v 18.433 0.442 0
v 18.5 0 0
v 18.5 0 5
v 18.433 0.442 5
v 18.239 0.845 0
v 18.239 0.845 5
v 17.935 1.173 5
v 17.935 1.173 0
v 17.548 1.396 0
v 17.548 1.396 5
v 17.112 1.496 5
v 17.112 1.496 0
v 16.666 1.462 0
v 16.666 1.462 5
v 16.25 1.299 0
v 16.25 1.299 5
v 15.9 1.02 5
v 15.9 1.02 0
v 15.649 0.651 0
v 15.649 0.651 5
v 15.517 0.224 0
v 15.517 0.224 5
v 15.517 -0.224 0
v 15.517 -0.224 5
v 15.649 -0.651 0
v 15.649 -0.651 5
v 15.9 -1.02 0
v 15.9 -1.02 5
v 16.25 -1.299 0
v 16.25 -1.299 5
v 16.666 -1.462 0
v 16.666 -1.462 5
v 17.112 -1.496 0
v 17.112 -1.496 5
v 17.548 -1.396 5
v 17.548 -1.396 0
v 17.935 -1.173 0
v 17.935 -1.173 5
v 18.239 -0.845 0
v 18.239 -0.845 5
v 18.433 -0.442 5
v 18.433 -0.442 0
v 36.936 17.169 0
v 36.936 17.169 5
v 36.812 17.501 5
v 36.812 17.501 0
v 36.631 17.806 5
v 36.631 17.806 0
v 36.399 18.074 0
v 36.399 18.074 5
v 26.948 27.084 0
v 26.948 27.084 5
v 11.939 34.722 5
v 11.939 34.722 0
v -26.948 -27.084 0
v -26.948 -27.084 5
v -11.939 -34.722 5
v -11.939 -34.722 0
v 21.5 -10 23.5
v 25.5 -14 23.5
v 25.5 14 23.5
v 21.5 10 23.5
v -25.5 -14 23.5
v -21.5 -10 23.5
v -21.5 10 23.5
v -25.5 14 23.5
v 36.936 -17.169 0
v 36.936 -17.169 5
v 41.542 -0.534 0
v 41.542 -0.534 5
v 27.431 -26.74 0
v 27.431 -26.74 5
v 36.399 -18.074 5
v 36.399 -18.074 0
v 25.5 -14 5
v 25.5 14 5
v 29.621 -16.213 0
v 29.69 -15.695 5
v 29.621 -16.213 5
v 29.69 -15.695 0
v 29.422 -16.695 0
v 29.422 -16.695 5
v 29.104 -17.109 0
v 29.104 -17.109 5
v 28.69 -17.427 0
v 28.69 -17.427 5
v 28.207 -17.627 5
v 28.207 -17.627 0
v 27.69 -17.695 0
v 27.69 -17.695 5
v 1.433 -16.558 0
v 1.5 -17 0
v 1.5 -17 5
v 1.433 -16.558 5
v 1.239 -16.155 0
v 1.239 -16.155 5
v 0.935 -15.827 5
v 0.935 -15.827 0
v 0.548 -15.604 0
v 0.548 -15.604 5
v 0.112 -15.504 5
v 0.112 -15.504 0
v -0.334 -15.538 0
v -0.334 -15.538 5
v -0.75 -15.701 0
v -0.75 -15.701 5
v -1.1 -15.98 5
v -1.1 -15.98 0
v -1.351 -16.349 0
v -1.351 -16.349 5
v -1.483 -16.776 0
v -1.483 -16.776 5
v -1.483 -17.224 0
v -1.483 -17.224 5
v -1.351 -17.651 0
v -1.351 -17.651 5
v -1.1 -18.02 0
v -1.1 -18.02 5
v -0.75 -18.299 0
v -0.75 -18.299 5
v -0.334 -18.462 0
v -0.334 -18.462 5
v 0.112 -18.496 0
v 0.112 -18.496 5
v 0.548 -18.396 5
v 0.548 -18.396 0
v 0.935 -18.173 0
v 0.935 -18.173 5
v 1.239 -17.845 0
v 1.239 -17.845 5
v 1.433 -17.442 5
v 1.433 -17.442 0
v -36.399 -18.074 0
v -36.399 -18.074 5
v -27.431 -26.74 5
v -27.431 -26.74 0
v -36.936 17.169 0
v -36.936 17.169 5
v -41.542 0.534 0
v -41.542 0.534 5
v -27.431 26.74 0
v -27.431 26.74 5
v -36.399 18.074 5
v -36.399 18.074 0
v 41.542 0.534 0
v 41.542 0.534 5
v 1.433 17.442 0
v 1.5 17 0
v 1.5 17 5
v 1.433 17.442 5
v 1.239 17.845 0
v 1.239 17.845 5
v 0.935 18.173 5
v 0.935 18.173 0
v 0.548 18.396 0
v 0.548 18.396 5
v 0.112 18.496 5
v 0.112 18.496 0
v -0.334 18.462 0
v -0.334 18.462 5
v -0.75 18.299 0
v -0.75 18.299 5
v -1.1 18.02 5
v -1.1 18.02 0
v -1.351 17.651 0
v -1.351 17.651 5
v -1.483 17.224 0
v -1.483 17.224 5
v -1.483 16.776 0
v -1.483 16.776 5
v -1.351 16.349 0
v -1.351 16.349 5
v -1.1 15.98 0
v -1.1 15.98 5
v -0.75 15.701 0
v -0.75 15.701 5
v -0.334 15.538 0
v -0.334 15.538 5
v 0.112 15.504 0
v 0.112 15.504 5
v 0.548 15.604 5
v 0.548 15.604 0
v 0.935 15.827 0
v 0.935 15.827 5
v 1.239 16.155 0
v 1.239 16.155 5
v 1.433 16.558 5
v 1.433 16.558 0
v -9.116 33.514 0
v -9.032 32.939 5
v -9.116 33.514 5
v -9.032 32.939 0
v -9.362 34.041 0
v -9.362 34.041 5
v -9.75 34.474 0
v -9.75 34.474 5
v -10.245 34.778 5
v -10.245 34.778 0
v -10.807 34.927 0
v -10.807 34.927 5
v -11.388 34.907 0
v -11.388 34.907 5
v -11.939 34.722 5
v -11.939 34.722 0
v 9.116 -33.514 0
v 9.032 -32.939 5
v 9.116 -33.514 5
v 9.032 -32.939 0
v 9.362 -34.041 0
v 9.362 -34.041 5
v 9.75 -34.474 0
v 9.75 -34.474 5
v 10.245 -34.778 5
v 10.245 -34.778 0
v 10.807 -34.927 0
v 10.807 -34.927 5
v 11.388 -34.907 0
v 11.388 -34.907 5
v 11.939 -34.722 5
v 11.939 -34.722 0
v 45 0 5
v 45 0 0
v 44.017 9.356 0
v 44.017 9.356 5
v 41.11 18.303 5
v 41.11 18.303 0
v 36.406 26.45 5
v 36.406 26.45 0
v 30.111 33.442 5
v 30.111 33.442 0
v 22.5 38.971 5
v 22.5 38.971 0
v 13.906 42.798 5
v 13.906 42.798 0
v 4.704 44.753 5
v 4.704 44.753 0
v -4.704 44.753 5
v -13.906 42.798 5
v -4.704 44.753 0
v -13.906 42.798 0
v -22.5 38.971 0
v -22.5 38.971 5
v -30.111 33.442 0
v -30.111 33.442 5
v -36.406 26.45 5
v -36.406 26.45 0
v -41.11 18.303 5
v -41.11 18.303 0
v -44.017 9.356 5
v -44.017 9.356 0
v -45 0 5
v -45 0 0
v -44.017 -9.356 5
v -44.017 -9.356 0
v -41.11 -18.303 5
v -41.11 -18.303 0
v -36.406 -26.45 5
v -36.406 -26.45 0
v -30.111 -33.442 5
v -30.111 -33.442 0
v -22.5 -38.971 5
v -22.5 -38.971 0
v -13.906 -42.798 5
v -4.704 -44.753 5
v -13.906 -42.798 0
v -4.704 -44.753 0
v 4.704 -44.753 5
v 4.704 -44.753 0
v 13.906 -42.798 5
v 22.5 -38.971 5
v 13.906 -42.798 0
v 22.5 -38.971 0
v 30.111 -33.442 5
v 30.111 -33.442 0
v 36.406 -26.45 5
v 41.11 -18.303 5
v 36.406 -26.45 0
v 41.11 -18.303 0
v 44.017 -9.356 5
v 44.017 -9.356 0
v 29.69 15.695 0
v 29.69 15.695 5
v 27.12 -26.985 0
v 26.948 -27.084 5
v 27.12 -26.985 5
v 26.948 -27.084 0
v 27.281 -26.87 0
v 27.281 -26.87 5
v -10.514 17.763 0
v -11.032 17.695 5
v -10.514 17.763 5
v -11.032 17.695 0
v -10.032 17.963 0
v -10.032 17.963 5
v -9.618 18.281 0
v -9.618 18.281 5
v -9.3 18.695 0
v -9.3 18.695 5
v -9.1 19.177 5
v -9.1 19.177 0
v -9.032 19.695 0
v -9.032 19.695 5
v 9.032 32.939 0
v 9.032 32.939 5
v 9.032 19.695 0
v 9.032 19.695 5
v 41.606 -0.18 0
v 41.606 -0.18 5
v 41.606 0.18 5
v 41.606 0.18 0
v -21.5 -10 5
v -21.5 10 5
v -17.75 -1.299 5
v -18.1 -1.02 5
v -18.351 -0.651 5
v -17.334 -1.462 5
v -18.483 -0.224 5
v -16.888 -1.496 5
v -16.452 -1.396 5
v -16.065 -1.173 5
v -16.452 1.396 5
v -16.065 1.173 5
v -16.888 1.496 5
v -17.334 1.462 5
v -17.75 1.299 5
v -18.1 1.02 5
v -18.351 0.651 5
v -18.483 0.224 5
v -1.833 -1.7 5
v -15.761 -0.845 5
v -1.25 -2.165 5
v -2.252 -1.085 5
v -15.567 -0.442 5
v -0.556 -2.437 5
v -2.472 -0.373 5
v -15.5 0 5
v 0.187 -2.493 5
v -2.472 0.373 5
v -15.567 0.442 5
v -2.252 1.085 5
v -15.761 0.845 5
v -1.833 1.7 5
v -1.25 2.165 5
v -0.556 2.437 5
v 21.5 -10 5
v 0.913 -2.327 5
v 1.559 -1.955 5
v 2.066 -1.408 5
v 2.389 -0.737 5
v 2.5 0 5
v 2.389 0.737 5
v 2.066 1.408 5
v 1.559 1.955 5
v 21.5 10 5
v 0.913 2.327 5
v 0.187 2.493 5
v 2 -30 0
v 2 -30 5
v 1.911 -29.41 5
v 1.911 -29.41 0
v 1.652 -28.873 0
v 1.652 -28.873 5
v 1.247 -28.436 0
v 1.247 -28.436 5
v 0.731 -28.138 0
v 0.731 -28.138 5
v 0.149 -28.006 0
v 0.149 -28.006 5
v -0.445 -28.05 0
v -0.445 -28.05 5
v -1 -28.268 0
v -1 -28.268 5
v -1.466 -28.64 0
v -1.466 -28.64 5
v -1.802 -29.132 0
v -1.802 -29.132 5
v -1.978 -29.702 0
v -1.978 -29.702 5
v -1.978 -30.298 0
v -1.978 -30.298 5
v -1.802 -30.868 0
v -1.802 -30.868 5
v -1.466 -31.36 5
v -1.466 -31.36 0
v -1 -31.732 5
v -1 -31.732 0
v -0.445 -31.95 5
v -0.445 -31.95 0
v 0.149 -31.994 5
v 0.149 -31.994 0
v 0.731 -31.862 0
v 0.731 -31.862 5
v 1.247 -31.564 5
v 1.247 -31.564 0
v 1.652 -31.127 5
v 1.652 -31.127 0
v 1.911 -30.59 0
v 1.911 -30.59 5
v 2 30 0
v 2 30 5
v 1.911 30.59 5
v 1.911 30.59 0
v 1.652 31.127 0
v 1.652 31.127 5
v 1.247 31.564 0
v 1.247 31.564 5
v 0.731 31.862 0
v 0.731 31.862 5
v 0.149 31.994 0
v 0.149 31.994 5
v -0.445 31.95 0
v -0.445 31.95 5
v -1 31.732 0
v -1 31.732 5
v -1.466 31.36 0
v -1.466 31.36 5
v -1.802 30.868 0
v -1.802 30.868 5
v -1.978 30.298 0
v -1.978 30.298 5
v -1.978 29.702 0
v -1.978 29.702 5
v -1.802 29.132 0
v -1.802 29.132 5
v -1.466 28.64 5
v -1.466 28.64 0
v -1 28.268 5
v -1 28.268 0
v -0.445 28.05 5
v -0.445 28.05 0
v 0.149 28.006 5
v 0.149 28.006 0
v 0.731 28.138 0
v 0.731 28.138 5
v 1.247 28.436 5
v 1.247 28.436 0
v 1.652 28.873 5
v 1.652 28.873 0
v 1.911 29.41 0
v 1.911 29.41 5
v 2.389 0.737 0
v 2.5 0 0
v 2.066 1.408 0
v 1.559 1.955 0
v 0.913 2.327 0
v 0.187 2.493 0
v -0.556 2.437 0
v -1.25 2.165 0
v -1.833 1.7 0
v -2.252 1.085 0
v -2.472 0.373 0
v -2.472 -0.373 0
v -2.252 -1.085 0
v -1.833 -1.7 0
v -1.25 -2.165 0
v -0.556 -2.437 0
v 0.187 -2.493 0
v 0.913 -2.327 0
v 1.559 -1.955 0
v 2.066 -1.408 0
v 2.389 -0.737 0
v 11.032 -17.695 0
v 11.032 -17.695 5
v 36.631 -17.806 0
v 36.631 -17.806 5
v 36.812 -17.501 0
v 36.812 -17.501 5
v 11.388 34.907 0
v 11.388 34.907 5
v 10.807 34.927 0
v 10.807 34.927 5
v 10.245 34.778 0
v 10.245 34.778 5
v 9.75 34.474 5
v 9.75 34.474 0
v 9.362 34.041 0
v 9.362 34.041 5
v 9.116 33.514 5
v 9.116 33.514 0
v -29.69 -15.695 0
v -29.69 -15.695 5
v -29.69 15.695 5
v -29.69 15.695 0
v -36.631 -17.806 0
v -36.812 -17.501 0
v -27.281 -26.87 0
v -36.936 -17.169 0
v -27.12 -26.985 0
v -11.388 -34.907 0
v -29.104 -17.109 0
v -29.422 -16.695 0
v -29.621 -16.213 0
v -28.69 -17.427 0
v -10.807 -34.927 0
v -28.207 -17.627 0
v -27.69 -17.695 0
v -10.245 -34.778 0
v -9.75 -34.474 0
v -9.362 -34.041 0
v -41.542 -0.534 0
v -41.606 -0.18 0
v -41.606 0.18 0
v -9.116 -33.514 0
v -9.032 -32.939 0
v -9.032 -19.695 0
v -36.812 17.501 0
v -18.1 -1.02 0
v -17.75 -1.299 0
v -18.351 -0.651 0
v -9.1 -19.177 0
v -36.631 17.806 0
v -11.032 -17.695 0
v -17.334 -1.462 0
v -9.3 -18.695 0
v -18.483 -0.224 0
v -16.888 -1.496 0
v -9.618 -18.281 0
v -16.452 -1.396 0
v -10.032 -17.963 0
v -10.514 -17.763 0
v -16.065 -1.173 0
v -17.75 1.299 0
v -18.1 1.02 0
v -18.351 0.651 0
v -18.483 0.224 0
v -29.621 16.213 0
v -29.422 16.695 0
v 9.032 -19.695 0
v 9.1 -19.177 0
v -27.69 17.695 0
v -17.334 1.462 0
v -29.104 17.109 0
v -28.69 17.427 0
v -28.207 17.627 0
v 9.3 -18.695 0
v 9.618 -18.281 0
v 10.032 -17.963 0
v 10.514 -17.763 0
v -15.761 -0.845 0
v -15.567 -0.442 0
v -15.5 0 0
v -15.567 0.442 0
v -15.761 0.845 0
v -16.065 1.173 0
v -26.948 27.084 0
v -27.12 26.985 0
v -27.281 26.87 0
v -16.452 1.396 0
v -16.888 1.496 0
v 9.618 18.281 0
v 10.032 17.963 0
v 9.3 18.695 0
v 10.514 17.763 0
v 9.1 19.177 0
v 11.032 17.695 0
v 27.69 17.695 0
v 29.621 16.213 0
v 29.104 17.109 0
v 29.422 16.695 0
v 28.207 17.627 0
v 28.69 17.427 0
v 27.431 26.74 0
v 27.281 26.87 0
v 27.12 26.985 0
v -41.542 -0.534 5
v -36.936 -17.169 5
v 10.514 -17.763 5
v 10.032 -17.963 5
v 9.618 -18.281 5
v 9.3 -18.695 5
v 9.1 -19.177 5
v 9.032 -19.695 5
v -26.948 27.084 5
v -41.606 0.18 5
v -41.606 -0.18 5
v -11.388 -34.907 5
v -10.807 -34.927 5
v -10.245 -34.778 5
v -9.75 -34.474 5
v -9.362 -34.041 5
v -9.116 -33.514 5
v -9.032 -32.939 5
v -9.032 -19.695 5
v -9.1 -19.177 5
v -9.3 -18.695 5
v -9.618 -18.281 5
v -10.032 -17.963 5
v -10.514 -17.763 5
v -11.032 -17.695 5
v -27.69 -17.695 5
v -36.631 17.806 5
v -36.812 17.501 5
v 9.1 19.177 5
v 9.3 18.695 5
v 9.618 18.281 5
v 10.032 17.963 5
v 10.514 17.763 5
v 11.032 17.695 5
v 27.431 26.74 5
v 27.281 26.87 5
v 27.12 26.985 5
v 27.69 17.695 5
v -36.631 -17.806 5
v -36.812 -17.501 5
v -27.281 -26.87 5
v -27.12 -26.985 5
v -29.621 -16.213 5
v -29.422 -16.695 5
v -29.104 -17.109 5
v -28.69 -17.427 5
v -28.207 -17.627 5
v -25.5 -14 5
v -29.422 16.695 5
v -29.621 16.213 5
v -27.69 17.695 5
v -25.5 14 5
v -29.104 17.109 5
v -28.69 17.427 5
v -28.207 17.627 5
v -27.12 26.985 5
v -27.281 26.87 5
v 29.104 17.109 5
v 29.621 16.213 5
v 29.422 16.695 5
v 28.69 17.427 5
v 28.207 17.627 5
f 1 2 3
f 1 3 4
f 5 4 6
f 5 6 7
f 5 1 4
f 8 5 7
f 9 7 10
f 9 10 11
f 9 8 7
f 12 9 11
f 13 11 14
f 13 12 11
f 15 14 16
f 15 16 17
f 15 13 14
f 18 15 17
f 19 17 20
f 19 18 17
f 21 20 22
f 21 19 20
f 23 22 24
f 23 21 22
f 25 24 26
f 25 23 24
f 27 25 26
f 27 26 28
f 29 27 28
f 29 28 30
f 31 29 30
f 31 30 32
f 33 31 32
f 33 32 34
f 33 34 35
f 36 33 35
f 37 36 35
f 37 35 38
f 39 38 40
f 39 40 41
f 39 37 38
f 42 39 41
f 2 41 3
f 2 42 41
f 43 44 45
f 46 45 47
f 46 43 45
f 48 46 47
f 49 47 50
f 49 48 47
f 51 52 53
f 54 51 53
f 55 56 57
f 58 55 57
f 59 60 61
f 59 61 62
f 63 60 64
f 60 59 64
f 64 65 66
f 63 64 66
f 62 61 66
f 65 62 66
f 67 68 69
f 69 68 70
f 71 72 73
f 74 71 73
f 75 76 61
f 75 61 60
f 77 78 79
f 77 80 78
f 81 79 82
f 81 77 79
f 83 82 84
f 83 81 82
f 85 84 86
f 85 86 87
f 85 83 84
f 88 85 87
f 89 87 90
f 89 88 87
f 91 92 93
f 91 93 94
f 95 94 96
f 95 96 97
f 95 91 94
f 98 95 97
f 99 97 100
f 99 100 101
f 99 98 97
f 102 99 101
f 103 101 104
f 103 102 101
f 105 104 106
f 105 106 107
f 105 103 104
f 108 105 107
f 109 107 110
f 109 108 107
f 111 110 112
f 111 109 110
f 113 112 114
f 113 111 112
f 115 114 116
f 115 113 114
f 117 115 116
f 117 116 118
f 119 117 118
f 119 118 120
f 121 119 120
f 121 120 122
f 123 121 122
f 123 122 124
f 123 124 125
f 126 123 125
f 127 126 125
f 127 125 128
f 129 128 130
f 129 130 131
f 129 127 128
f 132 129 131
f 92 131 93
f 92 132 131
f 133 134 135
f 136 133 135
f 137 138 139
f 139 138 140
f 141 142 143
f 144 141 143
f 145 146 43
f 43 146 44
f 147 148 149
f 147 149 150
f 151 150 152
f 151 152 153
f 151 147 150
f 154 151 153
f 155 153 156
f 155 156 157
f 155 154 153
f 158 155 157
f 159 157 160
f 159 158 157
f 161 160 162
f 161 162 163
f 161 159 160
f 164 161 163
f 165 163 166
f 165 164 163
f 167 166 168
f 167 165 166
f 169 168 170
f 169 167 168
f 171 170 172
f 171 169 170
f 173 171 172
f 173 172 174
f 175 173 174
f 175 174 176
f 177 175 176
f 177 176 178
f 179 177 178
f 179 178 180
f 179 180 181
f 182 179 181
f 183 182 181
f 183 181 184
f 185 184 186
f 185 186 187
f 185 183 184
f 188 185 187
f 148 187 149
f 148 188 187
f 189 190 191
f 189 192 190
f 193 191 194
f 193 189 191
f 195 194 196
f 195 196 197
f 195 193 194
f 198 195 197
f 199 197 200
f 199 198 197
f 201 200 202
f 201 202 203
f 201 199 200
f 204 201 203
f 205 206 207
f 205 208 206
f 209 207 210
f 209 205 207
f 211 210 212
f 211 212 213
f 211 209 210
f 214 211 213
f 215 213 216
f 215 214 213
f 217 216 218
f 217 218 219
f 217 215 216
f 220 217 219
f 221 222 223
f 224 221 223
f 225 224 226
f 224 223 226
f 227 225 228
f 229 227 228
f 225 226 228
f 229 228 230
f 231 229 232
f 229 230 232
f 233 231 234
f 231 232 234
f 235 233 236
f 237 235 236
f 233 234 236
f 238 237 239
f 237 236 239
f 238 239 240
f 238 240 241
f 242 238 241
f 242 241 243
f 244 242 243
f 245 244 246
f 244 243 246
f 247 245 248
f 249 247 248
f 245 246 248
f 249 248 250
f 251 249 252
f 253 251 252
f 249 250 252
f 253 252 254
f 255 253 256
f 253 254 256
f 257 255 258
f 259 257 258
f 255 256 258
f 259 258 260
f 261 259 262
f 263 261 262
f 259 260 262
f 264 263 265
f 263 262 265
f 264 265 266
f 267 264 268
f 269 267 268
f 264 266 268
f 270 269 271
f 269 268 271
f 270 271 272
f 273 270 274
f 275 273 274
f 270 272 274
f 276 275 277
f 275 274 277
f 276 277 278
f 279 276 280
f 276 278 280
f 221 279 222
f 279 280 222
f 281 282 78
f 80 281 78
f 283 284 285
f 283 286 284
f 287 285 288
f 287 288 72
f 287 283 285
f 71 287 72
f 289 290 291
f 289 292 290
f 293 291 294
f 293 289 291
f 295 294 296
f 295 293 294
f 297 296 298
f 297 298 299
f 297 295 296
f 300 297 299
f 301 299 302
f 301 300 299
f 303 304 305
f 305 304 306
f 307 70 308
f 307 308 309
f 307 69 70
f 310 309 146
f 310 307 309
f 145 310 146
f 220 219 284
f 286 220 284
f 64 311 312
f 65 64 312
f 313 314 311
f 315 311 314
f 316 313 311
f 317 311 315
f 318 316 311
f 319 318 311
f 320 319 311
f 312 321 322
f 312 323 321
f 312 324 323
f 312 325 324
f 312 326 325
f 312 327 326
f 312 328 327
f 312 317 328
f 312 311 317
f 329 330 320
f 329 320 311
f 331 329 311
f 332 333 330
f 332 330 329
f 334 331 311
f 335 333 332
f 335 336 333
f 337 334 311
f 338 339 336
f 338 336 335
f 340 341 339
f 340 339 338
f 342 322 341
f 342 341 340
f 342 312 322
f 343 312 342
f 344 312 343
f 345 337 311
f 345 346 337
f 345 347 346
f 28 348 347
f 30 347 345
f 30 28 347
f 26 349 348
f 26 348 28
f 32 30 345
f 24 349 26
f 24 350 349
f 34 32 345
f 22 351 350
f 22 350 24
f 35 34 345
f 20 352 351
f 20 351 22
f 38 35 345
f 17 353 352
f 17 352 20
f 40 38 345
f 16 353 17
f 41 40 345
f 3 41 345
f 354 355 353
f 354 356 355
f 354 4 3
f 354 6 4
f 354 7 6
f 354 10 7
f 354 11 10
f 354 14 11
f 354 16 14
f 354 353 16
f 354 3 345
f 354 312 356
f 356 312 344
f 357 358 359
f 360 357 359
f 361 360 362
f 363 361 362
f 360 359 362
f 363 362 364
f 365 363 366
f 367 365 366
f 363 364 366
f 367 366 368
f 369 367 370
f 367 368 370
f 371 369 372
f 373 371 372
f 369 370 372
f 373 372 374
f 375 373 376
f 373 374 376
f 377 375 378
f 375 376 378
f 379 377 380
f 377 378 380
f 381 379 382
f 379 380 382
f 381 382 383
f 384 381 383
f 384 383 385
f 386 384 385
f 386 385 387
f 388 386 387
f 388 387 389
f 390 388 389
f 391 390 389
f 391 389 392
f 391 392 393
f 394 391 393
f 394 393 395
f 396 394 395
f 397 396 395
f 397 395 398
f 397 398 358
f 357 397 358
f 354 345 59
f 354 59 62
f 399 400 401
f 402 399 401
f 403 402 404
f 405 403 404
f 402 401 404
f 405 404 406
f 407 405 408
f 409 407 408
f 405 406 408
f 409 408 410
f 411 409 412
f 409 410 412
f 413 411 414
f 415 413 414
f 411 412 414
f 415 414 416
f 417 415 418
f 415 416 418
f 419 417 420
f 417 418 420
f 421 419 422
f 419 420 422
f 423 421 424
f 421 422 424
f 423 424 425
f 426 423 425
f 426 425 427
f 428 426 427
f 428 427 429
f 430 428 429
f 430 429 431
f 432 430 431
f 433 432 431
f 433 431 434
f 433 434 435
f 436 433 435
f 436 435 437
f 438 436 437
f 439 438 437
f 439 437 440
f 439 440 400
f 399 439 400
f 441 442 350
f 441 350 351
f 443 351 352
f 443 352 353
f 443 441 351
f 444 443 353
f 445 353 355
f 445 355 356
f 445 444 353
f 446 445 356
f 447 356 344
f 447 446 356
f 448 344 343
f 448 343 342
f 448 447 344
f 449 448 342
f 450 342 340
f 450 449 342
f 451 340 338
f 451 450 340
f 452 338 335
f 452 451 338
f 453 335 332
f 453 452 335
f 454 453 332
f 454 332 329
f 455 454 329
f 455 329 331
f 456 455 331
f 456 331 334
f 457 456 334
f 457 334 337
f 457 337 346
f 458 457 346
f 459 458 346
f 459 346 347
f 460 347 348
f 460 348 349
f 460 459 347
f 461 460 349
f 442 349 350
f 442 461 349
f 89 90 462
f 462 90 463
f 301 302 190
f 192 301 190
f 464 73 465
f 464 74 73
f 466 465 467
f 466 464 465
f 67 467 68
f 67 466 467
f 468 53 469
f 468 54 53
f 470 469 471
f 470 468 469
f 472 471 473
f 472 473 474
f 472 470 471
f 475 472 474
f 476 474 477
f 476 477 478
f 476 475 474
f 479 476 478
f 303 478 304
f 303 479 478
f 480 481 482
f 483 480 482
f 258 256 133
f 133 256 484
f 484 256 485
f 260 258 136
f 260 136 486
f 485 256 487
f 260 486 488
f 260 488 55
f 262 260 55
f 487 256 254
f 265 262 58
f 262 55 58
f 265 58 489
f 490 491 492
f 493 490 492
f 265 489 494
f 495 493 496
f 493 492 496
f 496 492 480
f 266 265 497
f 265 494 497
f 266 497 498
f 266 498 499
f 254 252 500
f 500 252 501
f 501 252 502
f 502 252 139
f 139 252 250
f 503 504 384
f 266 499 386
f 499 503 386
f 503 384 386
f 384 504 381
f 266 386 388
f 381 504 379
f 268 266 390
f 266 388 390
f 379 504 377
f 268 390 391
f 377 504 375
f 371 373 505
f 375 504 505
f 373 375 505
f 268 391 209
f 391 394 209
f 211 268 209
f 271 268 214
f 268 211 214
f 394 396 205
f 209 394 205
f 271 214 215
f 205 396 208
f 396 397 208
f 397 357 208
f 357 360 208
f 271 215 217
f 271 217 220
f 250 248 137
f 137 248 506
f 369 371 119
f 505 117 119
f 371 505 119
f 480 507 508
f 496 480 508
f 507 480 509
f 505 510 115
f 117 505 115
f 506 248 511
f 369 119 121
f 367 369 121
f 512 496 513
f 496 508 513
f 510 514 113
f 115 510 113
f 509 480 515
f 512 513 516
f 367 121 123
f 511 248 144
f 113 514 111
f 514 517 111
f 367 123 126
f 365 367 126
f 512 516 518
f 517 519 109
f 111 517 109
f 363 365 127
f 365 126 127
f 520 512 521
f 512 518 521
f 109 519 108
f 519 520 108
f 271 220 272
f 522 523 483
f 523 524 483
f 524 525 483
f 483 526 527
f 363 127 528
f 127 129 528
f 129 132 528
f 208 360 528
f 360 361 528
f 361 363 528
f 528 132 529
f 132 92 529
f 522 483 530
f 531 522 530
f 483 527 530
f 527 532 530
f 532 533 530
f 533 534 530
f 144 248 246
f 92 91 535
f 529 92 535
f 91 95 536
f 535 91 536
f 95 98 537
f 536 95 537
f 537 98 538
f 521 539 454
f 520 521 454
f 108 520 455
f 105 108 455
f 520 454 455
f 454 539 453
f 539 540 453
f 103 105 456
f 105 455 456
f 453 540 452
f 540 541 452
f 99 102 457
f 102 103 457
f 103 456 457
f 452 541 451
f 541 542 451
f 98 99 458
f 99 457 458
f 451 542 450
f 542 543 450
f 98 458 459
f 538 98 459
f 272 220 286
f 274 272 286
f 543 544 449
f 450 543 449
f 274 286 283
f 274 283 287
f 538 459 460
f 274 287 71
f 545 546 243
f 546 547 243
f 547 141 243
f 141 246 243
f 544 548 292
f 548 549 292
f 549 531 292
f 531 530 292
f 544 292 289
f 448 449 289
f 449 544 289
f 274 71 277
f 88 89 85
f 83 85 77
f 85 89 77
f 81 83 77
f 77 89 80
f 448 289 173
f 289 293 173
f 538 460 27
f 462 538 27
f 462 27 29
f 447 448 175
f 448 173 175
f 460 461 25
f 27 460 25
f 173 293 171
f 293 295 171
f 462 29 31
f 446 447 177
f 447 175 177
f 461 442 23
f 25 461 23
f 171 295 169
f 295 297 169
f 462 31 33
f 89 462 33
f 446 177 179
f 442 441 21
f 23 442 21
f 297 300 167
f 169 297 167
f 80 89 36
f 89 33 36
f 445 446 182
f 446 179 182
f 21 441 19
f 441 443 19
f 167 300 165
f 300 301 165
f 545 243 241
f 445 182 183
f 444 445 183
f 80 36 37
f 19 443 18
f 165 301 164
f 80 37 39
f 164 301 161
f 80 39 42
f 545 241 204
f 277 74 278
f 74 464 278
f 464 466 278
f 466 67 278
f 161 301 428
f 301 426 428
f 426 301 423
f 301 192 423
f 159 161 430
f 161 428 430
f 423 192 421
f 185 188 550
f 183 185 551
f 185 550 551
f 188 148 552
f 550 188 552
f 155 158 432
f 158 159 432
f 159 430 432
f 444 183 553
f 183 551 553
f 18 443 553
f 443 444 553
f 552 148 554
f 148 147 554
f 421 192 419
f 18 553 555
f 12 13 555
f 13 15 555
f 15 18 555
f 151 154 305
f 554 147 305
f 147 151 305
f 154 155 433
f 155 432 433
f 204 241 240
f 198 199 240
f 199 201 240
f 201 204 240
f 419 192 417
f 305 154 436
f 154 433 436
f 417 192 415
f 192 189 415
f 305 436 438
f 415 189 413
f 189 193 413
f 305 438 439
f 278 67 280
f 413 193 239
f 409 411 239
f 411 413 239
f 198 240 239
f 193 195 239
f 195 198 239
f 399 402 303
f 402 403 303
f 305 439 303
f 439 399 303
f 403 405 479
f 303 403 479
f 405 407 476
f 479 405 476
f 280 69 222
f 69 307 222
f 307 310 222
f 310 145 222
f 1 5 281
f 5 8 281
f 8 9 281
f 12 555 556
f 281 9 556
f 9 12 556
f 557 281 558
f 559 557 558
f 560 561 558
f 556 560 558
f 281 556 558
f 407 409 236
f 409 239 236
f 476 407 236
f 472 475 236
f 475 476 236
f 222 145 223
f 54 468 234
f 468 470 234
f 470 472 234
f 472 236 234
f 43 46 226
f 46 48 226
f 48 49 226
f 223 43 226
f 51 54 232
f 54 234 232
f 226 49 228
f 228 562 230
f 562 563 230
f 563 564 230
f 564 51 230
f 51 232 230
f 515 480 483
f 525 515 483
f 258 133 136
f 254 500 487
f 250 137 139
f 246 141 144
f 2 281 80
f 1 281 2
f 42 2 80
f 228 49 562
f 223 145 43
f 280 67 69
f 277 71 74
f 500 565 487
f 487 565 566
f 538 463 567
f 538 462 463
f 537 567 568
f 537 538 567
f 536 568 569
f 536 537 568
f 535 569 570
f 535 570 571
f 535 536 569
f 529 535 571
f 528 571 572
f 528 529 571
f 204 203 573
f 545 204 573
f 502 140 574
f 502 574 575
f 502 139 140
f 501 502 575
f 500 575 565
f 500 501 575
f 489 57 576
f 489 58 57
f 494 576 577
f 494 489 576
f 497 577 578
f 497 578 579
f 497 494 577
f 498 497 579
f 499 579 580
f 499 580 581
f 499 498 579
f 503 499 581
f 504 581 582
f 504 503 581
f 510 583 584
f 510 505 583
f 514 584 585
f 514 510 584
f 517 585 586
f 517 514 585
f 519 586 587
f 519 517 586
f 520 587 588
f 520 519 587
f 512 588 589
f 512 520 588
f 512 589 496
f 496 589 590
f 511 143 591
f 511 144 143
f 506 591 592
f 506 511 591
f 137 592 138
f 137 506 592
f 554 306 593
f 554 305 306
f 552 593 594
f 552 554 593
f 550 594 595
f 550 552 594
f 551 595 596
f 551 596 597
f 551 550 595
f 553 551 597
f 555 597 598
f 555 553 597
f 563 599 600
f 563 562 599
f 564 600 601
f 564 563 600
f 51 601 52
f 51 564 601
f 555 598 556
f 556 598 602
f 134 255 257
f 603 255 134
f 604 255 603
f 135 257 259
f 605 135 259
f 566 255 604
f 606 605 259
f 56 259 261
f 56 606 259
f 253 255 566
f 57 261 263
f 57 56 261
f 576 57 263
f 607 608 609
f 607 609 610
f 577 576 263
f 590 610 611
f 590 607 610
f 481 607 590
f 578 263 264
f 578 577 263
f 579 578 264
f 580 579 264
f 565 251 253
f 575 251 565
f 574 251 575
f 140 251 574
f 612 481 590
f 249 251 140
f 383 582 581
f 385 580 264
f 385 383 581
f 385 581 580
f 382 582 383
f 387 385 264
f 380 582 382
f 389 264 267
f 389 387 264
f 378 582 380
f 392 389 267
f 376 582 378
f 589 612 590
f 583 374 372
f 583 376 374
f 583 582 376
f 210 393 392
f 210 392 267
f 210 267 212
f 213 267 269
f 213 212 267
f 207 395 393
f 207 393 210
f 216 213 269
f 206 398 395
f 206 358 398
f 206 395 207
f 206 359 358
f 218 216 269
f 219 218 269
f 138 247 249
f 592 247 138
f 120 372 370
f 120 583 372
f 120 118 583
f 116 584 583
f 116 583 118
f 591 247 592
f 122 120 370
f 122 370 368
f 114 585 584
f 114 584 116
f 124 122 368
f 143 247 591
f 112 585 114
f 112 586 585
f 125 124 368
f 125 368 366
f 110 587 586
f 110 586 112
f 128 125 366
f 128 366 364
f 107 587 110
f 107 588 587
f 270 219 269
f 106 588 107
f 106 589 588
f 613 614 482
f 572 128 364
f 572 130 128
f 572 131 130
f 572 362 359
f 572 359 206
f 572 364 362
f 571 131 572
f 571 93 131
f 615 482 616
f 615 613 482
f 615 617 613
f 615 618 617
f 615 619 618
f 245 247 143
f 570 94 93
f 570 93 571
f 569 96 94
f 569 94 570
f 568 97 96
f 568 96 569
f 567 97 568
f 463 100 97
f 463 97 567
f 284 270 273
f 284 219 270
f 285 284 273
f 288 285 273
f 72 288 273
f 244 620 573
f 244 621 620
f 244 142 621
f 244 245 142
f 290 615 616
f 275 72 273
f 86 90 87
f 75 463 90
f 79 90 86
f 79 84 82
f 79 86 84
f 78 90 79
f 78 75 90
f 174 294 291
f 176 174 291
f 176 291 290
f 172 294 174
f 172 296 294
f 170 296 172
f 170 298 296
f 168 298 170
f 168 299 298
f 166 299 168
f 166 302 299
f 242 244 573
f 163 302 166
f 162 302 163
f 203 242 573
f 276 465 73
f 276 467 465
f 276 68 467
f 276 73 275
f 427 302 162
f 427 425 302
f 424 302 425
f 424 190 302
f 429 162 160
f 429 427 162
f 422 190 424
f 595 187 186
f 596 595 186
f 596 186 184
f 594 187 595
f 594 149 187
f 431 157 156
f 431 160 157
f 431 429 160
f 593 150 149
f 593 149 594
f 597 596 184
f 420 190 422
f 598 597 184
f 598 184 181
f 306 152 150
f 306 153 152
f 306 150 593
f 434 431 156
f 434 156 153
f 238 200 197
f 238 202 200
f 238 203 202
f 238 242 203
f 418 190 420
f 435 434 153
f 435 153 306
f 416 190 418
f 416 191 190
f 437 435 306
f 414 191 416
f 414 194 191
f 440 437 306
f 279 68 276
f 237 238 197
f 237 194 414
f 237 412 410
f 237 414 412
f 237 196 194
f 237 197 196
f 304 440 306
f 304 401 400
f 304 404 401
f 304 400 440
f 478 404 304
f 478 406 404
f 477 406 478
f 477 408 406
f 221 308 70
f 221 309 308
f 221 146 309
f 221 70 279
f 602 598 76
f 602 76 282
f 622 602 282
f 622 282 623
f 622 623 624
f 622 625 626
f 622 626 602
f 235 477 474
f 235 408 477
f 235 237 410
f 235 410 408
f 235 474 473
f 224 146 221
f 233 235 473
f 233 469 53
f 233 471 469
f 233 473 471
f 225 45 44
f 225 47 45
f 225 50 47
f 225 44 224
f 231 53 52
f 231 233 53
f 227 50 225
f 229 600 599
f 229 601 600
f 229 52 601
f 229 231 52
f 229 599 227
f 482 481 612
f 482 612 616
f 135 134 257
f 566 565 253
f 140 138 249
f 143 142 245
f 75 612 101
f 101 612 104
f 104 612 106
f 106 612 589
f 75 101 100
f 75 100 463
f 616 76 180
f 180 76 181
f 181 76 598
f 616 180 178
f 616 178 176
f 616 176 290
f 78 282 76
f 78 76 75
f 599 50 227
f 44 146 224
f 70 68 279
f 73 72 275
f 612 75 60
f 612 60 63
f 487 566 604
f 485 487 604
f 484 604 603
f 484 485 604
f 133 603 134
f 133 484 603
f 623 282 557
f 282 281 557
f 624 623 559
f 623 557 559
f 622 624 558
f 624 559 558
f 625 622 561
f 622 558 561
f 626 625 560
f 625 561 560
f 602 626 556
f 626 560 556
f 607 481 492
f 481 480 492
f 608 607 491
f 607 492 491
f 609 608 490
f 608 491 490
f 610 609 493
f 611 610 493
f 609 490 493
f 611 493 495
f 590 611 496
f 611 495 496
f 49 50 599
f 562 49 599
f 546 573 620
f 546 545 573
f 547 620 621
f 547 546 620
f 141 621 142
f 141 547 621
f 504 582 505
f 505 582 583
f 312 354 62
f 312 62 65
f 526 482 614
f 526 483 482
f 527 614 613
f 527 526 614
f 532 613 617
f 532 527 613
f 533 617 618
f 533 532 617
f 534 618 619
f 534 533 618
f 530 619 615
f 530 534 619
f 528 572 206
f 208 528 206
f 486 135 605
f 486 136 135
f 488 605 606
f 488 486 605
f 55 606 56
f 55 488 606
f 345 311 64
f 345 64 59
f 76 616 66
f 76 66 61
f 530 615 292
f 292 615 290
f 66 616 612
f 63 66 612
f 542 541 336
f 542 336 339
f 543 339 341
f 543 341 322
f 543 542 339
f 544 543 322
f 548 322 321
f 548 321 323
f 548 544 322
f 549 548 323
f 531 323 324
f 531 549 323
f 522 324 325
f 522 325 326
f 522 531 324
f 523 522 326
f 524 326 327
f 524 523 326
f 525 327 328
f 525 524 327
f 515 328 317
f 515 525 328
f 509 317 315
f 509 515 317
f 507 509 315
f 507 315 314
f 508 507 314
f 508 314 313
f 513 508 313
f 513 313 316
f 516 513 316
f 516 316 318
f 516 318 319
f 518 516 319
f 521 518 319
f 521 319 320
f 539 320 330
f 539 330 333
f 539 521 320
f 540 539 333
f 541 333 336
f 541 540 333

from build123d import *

# Parameters (mm, degrees)
SKETCH1_R           = 45
SKETCH1_R_2         = 2.5
SKETCH1_R_3         = 1.5
BOSS_EXTRUDE1_DEPTH = 5
BOSS_EXTRUDE2_DEPTH = 18.5
SKETCH4_R           = 2
CUT_EXTRUDE1_DEPTH  = 10
CUT_EXTRUDE2_DEPTH  = 10
FILLET1_R           = 2


with BuildPart() as part:
    # Sketch1 → Boss-Extrude1 (new body)
    with BuildSketch(Plane.XY):
        Circle(SKETCH1_R)
        Circle(SKETCH1_R_2, mode=Mode.SUBTRACT)
        with Locations((0, 17)):
            Circle(SKETCH1_R_3, mode=Mode.SUBTRACT)
        with Locations((17, 0)):
            Circle(SKETCH1_R_3, mode=Mode.SUBTRACT)
        with Locations((0, -17)):
            Circle(SKETCH1_R_3, mode=Mode.SUBTRACT)
        with Locations((-17, 0)):
            Circle(SKETCH1_R_3, mode=Mode.SUBTRACT)
    extrude(amount=BOSS_EXTRUDE1_DEPTH)

    # Sketch2 → Boss-Extrude2 (add)
    with BuildSketch(Plane.XY.offset(5)):
        Polygon((-25.5, 10), (-25.5, -10), (-25.5, -14), (0, -14), (0, -10), (-21.5, -10), (-21.5, 10), (0, 10), (0, 14), (-25.5, 14), align=None)
    boss_extrude2 = extrude(amount=BOSS_EXTRUDE2_DEPTH)

    # Mirror1: Boss-Extrude2 across plane
    add(boss_extrude2.mirror(Plane(origin=(0, 0, 0), x_dir=(0, 0, 1), z_dir=(1, 0, 0))))

    # Sketch4 → Cut-Extrude1 (cut)
    with BuildSketch(Plane.XY.offset(5)):
        with Locations((0, 30)):
            Circle(SKETCH4_R)
        with Locations((0, -30)):
            Circle(SKETCH4_R)
    extrude(amount=-CUT_EXTRUDE1_DEPTH, mode=Mode.SUBTRACT)

    # Sketch5 → Cut-Extrude2 (cut)
    with BuildSketch(Plane.XY.offset(5)):
        Polygon((29.689632614, 17.695025445), (29.689632614, 0), (41.689632614, 0), (36.7907688, 17.695025445), (27.214994246, 26.948021081), (9.031781892, 36.201016717), (9.031781892, 17.695025445), align=None)
        Polygon((29.689632614, 0), (29.689632614, -17.695025445), (9.031781892, -17.695025445), (9.031781892, -36.201016717), (27.214994246, -26.948021081), (36.7907688, -17.695025445), (41.689632614, 0), align=None)
        Polygon((-29.689632614, -17.695025445), (-29.689632614, 0), (-41.689632614, 0), (-36.7907688, -17.695025445), (-27.214994246, -26.948021081), (-9.031781892, -36.201016717), (-9.031781892, -17.695025445), align=None)
        Polygon((-29.689632614, 0), (-29.689632614, 17.695025445), (-9.031781892, 17.695025445), (-9.031781892, 36.201016717), (-27.214994246, 26.948021081), (-36.7907688, 17.695025445), (-41.689632614, 0), align=None)
    extrude(amount=-CUT_EXTRUDE2_DEPTH, mode=Mode.SUBTRACT)

    # Fillet1
    fillet1_edges = [part.edges().sort_by_distance(p)[0] for p in [
        (9.031781892, -36.201016717, 2.5),
        (9.031781892, -17.695025445, 2.5),
        (29.689632614, -17.695025445, 2.5),
        (-29.689632614, -17.695025445, 2.5),
        (-9.031781892, -17.695025445, 2.5),
        (-9.031781892, -36.201016717, 2.5),
        (-27.214994246, -26.948021081, 2.5),
        (-36.7907688, -17.695025445, 2.5),
        (-41.689632614, 0, 2.5),
        (-36.7907688, 17.695025445, 2.5),
        (-27.214994246, 26.948021081, 2.5),
        (-9.031781892, 36.201016717, 2.5),
        (-9.031781892, 17.695025445, 2.5),
        (-29.689632614, 17.695025445, 2.5),
        (29.689632614, 17.695025445, 2.5),
        (9.031781892, 17.695025445, 2.5),
        (9.031781892, 36.201016717, 2.5),
        (27.214994246, 26.948021081, 2.5),
        (36.7907688, 17.695025445, 2.5),
        (41.689632614, 0, 2.5),
        (36.7907688, -17.695025445, 2.5),
        (27.214994246, -26.948021081, 2.5),
    ]]
    fillet(fillet1_edges, radius=FILLET1_R)


solid = part.part
